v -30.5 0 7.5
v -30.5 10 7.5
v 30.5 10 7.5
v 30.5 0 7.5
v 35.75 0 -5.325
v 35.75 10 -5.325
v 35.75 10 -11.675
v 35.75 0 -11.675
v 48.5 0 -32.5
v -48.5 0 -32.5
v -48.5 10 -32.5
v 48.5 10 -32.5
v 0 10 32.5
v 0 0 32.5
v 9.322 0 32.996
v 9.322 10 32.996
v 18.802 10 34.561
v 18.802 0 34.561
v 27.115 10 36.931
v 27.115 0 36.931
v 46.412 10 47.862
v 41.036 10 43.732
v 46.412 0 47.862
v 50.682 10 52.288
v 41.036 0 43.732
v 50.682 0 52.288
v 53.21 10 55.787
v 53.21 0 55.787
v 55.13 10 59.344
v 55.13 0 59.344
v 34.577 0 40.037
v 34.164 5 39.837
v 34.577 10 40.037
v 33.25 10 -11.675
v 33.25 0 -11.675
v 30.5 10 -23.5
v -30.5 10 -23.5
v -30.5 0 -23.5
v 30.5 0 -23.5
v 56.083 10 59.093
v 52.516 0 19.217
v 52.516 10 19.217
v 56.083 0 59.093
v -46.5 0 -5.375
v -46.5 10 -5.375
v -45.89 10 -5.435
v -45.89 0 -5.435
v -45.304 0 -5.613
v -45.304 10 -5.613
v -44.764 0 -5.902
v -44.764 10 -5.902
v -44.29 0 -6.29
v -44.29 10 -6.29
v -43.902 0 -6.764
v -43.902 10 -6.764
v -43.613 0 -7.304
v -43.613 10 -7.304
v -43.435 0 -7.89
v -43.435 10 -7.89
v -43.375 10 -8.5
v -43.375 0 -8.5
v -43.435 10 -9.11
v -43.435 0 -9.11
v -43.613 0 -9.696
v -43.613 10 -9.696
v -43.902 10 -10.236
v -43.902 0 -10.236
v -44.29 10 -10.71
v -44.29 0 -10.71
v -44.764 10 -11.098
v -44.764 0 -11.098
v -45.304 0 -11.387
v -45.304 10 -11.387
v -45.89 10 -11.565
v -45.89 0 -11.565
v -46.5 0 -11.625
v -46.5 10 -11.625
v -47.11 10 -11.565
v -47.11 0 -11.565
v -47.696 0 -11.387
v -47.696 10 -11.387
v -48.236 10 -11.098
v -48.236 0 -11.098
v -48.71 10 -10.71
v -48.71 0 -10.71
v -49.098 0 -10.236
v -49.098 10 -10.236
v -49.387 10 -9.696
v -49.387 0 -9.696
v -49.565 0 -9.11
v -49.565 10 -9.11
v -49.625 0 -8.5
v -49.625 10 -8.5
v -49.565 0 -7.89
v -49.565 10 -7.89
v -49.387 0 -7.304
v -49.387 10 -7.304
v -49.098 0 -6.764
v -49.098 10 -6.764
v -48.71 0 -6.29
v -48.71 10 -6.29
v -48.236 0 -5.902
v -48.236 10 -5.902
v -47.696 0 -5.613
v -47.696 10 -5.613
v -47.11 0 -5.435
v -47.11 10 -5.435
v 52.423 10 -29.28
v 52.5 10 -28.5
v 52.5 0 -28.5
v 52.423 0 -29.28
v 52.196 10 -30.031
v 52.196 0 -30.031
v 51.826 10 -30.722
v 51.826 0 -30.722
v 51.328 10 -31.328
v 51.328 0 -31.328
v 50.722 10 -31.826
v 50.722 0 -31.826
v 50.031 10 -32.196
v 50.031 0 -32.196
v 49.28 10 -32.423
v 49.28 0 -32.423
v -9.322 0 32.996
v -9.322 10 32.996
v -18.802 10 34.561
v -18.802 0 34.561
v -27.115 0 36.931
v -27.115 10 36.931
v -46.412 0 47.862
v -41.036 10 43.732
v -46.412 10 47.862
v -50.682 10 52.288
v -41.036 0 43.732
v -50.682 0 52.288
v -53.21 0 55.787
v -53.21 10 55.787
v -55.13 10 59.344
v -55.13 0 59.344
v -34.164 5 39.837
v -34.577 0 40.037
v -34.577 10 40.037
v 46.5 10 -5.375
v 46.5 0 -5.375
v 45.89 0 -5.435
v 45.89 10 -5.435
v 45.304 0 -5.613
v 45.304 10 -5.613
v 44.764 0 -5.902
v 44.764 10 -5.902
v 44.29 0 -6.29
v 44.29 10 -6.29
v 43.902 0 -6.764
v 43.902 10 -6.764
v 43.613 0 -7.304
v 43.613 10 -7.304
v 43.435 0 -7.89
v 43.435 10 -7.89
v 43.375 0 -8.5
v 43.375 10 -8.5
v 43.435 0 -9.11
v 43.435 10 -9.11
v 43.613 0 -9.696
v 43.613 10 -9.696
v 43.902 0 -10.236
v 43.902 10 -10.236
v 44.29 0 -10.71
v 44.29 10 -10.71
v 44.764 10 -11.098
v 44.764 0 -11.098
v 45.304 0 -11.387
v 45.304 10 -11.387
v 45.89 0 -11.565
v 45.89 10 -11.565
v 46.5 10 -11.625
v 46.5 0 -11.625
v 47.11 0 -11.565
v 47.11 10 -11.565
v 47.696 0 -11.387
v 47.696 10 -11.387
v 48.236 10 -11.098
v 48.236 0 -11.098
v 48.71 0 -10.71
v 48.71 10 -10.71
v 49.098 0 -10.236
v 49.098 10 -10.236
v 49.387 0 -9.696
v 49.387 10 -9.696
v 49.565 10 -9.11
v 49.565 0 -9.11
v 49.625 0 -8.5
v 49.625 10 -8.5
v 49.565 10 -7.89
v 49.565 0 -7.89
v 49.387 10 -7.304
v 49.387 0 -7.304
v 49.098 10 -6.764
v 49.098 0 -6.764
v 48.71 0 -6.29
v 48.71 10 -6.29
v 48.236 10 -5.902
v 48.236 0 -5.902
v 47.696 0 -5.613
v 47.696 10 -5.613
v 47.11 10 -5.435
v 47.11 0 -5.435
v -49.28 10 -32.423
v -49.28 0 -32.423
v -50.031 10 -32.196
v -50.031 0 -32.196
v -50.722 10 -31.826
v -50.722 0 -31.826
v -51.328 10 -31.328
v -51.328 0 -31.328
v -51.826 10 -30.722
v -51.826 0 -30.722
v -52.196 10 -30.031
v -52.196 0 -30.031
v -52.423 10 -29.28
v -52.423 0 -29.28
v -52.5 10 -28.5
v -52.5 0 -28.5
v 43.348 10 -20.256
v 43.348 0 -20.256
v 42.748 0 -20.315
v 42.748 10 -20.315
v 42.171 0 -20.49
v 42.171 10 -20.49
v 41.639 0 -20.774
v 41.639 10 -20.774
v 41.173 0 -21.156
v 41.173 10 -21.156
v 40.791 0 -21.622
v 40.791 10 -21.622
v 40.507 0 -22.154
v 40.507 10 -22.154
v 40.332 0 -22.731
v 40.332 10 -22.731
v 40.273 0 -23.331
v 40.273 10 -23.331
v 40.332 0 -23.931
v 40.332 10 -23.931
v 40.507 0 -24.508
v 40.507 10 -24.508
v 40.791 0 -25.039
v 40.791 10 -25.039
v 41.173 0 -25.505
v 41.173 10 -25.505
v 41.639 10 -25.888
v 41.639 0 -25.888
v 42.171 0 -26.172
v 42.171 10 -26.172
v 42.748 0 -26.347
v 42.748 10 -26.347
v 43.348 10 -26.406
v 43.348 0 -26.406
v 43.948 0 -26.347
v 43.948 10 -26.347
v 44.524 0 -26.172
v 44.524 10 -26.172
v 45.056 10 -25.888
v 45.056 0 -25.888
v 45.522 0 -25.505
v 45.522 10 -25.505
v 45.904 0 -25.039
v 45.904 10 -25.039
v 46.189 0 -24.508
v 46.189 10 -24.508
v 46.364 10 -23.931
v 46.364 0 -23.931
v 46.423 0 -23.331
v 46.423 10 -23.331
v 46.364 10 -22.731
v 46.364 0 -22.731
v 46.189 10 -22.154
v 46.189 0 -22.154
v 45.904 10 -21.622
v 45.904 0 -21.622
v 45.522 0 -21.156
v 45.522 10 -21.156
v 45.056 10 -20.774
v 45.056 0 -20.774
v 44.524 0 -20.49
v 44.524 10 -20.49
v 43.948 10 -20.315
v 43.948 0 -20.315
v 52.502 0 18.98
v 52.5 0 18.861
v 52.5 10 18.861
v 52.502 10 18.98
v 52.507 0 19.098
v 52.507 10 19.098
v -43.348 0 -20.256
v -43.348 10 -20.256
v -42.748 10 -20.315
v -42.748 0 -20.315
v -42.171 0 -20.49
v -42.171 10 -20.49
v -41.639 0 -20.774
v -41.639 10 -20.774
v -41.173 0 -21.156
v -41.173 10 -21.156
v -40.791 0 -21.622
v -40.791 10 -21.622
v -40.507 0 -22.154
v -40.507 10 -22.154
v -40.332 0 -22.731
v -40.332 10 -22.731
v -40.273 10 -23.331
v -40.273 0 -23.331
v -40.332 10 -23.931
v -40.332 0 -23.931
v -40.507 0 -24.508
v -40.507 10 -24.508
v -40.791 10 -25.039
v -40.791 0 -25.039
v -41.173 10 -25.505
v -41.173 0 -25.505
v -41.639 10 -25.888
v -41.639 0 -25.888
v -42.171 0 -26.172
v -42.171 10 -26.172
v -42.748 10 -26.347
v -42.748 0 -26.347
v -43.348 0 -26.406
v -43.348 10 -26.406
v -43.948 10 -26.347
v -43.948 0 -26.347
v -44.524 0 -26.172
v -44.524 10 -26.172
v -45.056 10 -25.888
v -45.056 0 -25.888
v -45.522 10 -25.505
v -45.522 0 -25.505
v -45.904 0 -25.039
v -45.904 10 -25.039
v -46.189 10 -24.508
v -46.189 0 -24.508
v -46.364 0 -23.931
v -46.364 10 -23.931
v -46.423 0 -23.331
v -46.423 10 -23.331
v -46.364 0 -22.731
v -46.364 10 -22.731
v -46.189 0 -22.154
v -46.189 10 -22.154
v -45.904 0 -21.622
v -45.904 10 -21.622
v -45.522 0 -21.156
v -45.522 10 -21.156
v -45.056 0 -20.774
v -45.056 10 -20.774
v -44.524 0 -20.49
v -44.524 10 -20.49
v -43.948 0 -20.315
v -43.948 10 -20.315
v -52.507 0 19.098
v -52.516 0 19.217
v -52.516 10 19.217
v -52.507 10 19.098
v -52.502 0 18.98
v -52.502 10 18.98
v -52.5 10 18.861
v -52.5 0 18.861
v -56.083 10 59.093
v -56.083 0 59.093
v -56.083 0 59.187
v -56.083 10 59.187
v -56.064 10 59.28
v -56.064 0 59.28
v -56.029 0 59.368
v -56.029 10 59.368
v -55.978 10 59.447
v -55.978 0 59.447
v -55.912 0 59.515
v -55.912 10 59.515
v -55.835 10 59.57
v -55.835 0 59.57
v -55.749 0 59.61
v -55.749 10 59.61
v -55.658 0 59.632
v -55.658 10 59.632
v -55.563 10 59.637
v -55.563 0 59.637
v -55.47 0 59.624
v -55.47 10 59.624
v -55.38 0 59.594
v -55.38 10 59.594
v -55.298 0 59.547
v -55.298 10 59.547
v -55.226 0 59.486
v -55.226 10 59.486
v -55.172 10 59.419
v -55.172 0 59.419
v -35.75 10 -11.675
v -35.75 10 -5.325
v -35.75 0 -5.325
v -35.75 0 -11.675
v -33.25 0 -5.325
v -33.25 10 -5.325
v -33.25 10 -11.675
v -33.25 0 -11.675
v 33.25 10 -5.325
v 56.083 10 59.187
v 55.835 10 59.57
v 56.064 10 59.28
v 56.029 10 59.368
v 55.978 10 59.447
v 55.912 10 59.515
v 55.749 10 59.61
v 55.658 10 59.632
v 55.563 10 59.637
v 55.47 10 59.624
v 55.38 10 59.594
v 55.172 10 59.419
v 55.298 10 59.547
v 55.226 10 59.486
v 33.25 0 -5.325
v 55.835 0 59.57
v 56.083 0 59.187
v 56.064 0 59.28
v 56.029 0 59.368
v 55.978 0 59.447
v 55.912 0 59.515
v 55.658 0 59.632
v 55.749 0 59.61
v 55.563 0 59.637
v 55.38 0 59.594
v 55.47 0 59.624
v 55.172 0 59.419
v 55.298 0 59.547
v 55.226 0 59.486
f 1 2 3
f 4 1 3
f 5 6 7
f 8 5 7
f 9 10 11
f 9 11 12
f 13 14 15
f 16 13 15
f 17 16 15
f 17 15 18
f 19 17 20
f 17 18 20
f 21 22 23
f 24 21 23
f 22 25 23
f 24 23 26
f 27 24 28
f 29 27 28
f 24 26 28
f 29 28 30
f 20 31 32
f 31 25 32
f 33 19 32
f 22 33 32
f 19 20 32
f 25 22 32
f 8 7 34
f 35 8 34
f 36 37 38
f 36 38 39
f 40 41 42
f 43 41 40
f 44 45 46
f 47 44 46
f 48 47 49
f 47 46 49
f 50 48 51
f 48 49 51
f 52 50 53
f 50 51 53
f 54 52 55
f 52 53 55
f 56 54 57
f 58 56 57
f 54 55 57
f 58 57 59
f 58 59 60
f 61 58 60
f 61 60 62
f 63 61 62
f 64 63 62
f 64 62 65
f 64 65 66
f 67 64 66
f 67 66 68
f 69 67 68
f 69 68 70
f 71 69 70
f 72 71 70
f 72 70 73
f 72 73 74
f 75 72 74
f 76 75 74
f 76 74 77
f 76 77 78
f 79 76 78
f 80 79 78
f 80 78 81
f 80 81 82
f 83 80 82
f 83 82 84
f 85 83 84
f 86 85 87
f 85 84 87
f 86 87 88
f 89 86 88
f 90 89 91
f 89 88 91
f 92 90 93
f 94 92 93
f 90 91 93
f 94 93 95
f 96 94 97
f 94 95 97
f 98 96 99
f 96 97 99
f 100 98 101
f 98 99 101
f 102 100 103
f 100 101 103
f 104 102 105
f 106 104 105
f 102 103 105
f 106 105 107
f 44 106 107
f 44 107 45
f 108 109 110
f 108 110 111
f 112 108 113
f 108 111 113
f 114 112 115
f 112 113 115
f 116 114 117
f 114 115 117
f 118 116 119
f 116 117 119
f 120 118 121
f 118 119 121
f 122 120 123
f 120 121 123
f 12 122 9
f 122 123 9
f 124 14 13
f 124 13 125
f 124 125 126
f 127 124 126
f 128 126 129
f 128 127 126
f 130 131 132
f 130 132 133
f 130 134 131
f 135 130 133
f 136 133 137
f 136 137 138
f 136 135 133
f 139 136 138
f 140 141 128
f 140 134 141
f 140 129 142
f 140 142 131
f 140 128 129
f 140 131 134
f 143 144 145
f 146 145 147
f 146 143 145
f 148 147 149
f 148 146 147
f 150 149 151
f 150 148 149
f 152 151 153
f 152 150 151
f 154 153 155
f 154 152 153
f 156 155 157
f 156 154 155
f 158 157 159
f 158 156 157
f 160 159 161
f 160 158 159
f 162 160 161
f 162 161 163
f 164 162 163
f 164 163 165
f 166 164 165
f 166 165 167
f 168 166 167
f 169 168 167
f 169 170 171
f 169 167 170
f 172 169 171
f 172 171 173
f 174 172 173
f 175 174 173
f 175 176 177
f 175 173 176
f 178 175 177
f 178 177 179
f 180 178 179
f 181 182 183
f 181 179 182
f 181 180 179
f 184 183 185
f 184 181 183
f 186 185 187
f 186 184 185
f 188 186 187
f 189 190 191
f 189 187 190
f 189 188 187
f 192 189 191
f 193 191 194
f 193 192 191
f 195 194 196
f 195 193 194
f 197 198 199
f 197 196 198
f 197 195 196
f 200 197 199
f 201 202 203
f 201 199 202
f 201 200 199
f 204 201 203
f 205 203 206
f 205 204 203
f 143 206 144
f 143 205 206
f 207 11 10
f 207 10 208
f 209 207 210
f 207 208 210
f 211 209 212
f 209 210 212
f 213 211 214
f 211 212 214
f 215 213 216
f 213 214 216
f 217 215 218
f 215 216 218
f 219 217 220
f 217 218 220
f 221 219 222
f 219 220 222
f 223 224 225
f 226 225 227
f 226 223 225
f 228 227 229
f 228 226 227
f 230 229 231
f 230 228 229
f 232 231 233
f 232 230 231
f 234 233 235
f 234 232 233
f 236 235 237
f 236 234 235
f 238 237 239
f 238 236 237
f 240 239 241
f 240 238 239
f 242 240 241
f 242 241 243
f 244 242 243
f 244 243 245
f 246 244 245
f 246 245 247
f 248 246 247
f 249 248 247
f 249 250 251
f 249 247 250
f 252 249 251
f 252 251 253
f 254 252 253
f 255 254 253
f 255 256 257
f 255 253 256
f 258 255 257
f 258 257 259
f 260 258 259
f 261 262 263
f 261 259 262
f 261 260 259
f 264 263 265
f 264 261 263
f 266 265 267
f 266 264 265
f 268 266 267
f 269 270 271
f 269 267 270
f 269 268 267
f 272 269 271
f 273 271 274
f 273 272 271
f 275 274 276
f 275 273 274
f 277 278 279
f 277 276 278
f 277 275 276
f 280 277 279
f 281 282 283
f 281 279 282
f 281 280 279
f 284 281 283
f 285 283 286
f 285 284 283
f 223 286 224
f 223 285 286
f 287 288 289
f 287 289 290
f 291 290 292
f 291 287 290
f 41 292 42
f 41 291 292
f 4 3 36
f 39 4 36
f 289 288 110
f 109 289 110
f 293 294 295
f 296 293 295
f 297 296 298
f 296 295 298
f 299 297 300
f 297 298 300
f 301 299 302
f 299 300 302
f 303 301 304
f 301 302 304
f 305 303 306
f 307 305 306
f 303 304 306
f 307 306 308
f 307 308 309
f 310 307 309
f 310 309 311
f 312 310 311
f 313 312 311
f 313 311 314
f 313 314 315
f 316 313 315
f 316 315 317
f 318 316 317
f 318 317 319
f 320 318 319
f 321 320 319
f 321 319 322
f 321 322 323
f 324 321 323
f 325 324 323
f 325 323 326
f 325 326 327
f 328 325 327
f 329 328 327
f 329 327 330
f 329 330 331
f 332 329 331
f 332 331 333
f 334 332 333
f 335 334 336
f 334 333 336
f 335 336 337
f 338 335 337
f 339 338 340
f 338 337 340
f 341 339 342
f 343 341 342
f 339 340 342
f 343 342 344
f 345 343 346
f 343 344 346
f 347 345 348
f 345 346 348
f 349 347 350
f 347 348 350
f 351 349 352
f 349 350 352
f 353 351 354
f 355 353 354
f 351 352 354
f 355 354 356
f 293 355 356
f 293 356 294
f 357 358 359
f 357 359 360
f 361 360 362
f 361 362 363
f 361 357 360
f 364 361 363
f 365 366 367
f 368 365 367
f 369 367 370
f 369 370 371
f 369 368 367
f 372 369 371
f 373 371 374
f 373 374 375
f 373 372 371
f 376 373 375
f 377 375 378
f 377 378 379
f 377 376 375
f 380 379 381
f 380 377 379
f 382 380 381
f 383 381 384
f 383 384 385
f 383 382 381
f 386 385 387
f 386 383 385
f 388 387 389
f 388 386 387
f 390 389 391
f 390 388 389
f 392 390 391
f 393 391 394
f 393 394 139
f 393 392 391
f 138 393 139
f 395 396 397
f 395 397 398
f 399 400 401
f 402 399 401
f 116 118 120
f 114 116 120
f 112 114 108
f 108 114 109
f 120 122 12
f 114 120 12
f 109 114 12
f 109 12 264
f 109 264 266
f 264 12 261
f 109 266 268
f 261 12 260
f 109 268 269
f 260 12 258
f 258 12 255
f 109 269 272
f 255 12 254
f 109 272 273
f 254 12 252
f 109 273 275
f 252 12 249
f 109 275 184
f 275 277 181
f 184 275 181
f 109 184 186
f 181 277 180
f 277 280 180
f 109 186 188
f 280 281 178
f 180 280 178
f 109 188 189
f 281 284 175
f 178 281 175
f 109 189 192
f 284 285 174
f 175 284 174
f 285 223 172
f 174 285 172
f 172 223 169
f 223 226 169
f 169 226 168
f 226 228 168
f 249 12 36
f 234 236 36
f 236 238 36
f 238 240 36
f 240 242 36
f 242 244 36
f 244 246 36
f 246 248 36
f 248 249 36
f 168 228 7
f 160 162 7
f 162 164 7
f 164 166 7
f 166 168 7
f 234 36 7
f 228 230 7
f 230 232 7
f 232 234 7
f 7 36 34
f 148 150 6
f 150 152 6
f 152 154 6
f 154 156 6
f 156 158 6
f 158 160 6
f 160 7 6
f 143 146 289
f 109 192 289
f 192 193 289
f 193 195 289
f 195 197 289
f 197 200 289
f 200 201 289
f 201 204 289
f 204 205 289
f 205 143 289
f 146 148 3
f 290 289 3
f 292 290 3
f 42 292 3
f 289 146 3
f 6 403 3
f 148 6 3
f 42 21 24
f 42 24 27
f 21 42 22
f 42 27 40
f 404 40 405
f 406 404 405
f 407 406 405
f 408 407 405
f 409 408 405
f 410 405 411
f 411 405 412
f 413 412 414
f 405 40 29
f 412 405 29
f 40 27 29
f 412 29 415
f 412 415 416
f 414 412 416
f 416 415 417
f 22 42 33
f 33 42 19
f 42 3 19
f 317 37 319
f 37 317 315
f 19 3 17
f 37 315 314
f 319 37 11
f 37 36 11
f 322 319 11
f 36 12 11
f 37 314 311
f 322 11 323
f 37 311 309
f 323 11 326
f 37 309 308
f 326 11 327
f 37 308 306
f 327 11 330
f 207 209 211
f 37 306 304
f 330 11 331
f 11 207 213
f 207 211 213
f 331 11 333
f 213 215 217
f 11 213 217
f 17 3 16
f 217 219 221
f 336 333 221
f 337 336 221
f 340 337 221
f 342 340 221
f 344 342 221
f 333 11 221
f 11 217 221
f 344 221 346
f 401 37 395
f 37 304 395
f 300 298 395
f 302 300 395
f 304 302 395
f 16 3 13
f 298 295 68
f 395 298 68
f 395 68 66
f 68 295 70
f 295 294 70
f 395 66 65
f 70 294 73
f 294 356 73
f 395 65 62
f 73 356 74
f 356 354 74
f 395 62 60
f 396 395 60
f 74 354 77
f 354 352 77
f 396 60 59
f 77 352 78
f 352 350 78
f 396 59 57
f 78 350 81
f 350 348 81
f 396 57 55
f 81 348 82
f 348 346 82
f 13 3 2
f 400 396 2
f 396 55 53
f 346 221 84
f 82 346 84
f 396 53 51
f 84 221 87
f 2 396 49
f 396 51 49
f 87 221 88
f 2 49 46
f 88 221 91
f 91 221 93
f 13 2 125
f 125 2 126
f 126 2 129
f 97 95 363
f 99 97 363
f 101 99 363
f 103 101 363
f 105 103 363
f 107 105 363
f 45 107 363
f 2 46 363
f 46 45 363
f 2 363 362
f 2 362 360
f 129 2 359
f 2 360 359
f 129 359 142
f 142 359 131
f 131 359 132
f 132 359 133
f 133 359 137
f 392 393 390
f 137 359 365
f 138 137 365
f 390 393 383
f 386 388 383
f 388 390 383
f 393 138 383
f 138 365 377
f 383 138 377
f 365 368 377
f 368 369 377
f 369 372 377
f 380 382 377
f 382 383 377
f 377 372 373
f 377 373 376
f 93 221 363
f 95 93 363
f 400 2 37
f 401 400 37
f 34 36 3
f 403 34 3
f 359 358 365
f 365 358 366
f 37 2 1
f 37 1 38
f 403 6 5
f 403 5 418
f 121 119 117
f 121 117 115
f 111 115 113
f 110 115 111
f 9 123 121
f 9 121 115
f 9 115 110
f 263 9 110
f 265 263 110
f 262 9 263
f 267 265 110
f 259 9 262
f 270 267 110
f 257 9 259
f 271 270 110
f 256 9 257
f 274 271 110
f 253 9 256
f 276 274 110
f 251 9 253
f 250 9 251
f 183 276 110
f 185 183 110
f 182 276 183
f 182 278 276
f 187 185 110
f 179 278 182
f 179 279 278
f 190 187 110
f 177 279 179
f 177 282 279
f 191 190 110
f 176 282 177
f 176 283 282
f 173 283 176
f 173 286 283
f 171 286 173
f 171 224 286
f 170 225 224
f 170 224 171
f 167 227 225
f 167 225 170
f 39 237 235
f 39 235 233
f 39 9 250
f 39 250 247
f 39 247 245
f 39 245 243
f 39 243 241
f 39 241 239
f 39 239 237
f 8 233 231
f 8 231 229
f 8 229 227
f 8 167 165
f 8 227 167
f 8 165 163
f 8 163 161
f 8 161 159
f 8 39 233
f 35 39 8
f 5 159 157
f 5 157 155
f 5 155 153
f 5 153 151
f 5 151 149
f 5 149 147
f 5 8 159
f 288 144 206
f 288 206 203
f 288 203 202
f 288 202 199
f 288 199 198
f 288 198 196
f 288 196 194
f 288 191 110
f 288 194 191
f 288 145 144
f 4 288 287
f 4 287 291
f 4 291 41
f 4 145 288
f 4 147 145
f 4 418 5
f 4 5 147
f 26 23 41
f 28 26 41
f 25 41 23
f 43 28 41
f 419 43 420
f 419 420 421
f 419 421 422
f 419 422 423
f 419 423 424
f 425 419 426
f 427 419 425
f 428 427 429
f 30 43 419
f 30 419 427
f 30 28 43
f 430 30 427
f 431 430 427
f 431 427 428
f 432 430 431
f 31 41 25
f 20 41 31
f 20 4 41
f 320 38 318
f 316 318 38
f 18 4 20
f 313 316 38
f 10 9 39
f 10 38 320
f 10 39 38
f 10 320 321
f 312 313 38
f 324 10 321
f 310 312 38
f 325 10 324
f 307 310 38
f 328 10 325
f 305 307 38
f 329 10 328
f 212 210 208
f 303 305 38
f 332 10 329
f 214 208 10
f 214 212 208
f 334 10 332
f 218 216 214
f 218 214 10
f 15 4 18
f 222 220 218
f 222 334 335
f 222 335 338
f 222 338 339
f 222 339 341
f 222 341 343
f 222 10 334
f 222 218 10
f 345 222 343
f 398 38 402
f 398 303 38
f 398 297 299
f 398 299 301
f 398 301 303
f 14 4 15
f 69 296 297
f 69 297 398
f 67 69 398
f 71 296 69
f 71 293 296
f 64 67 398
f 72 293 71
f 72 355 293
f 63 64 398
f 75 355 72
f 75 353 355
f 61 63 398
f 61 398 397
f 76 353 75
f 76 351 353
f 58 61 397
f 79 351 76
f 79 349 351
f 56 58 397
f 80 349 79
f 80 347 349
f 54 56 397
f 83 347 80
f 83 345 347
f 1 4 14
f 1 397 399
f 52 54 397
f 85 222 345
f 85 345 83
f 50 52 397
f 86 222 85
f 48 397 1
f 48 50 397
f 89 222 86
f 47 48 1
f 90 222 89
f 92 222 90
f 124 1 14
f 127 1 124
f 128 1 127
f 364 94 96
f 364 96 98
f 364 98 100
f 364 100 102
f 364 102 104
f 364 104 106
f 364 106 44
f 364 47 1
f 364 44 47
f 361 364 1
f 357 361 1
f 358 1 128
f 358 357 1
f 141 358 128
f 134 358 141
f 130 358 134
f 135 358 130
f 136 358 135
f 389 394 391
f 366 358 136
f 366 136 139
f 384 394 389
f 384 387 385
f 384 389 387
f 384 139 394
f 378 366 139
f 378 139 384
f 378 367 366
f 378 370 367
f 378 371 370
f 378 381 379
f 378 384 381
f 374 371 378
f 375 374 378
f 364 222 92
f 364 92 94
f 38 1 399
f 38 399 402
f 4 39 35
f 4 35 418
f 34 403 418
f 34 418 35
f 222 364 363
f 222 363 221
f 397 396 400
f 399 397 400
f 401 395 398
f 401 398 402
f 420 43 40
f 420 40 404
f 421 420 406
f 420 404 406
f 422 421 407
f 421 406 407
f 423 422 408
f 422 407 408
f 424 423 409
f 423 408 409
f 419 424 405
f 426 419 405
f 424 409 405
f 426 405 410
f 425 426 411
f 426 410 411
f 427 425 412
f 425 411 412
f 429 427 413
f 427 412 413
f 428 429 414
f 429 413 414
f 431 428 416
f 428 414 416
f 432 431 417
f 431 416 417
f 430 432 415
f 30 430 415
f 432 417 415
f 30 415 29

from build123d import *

# Parameters (mm, degrees)
SKETCH1_W           = 105
SKETCH1_H           = 65
BOSS_EXTRUDE1_DEPTH = 10
SKETCH2_W           = 61
SKETCH2_H           = 31
CUT_EXTRUDE1_DEPTH  = 63.549980016
SKETCH4_R           = 3.125
SKETCH4_W           = 2.5
SKETCH4_H           = 6.35
CUT_EXTRUDE3_DEPTH  = 63.549980016
BOSS_EXTRUDE2_DEPTH = 10
SKETCH6_R           = 3.075
CUT_EXTRUDE4_DEPTH  = 85.949986617
FILLET1_R           = 4
FILLET2_R           = 0.5


with BuildPart() as part:
    # Sketch1 → Boss-Extrude1 (new body)
    with BuildSketch(Plane(origin=(0, 0, 0), x_dir=(1, 0, 0), z_dir=(0, 1, 0))):
        Rectangle(SKETCH1_W, SKETCH1_H)
    extrude(amount=BOSS_EXTRUDE1_DEPTH)

    # Sketch2 → Cut-Extrude1 (cut, through all)
    with BuildSketch(Plane(origin=(0, 10, 0), x_dir=(1, 0, 0), z_dir=(0, 1, 0))):
        with Locations((0, 8)):
            Rectangle(SKETCH2_W, SKETCH2_H)
    extrude(amount=-CUT_EXTRUDE1_DEPTH, mode=Mode.SUBTRACT)

    # Sketch4 → Cut-Extrude3 (cut, through all)
    with BuildSketch(Plane(origin=(0, 10, 0), x_dir=(1, 0, 0), z_dir=(0, 1, 0))):
        with Locations(Location((-46.5, 8.5, 0), (0, 0, 270))):
            Circle(SKETCH4_R)
        with Locations((-34.5, 8.5)):
            Rectangle(SKETCH4_W, SKETCH4_H)
    cut_extrude3 = extrude(amount=-CUT_EXTRUDE3_DEPTH, mode=Mode.SUBTRACT)

    # Sketch5 → Boss-Extrude2 (add)
    with BuildSketch(Plane(origin=(0, 0, 0), x_dir=(1, 0, 0), z_dir=(0, 1, 0))):
        with BuildLine():
            Line((0, -32.5), (-52.5, -19.039128985))
            Line((-52.5, -19.039128985), (-56.408079011, -62.726619731))
            add(Edge.make_bspline(
                [(0, -32.5), (-47.244656315, -32.5), (-56.408079011, -62.726619731)],
                knots=[4.71238898, 4.71238898, 4.71238898, 6.087991355, 6.087991355, 6.087991355], degree=2, weights=[1, 0.772643775, 1]))
        make_face()
    boss_extrude2 = extrude(amount=BOSS_EXTRUDE2_DEPTH)

    # Sketch6 → Cut-Extrude4 (cut, through all)
    with BuildSketch(Plane(origin=(0, 10, 0), x_dir=(1, 0, 0), z_dir=(0, 1, 0))):
        with Locations(Location((-43.347709835, 23.330814615, 0), (0, 0, 270))):
            Circle(SKETCH6_R)
    cut_extrude4 = extrude(amount=-CUT_EXTRUDE4_DEPTH, mode=Mode.SUBTRACT)

    # Mirror1: Cut-Extrude3, Boss-Extrude2, Cut-Extrude4 across plane
    add(cut_extrude3.mirror(Plane(origin=(0, 0, 0), x_dir=(0, 0, 1), z_dir=(1, 0, 0))), mode=Mode.SUBTRACT)
    add(boss_extrude2.mirror(Plane(origin=(0, 0, 0), x_dir=(0, 0, 1), z_dir=(1, 0, 0))))
    add(cut_extrude4.mirror(Plane(origin=(0, 0, 0), x_dir=(0, 0, 1), z_dir=(1, 0, 0))), mode=Mode.SUBTRACT)

    # Fillet1
    # the kernel refuses this fillet: 4 mm, written as the material it adds along each edge
    with BuildSketch(Plane(origin=(-52.5, 0, 19.039128985), x_dir=(0, 0, -1), z_dir=(0, 1, 0))) as fillet1_piece_1:
        with BuildLine():
            CenterArc((FILLET1_R * 0.0446385419256, FILLET1_R), FILLET1_R, 264.888193347, 5.111806653)
            Line((-FILLET1_R * 0.0444610022252, FILLET1_R * 0.00397727373713), (0, 0))
            Line((0, 0), (FILLET1_R * 0.0446385419256, 0))
        make_face()
    extrude(amount=10)
    with BuildSketch(Plane(origin=(52.5, 0, 19.039128985), x_dir=(0, 0, -1), z_dir=(0, 1, 0))) as fillet1_piece_2:
        with BuildLine():
            CenterArc((FILLET1_R * 0.0446385419256, -FILLET1_R), FILLET1_R, 90, 5.111806653)
            Line((-FILLET1_R * 0.0444610022252, -FILLET1_R * 0.00397727373713), (0, 0))
            Line((0, 0), (FILLET1_R * 0.0446385419256, 0))
        make_face()
    extrude(amount=10)
    # the kernel refuses this fillet: 4 mm, written as the material it takes off along each edge
    with BuildSketch(Plane(origin=(-52.5, -10, -32.5), x_dir=(0, 0, 1), z_dir=(0, 1, 0)), Plane(origin=(52.5, -10, -32.5), x_dir=(-1, 0, 0), z_dir=(0, 1, 0))) as fillet1_2_piece_1:
        with BuildLine():
            CenterArc((FILLET1_R, FILLET1_R), FILLET1_R, 180, 90)
            Line((0, FILLET1_R), (0, 0))
            Line((0, 0), (FILLET1_R, 0))
        make_face()
    extrude(amount=30, mode=Mode.SUBTRACT)

    # Fillet2
    fillet2_edges = [part.edges().sort_by_distance(p)[0] for p in [
        (56.408079011, 5, 62.726619731),
        (-56.408079011, 5, 62.726619731),
    ]]
    fillet(fillet2_edges, radius=FILLET2_R)


solid = part.part
